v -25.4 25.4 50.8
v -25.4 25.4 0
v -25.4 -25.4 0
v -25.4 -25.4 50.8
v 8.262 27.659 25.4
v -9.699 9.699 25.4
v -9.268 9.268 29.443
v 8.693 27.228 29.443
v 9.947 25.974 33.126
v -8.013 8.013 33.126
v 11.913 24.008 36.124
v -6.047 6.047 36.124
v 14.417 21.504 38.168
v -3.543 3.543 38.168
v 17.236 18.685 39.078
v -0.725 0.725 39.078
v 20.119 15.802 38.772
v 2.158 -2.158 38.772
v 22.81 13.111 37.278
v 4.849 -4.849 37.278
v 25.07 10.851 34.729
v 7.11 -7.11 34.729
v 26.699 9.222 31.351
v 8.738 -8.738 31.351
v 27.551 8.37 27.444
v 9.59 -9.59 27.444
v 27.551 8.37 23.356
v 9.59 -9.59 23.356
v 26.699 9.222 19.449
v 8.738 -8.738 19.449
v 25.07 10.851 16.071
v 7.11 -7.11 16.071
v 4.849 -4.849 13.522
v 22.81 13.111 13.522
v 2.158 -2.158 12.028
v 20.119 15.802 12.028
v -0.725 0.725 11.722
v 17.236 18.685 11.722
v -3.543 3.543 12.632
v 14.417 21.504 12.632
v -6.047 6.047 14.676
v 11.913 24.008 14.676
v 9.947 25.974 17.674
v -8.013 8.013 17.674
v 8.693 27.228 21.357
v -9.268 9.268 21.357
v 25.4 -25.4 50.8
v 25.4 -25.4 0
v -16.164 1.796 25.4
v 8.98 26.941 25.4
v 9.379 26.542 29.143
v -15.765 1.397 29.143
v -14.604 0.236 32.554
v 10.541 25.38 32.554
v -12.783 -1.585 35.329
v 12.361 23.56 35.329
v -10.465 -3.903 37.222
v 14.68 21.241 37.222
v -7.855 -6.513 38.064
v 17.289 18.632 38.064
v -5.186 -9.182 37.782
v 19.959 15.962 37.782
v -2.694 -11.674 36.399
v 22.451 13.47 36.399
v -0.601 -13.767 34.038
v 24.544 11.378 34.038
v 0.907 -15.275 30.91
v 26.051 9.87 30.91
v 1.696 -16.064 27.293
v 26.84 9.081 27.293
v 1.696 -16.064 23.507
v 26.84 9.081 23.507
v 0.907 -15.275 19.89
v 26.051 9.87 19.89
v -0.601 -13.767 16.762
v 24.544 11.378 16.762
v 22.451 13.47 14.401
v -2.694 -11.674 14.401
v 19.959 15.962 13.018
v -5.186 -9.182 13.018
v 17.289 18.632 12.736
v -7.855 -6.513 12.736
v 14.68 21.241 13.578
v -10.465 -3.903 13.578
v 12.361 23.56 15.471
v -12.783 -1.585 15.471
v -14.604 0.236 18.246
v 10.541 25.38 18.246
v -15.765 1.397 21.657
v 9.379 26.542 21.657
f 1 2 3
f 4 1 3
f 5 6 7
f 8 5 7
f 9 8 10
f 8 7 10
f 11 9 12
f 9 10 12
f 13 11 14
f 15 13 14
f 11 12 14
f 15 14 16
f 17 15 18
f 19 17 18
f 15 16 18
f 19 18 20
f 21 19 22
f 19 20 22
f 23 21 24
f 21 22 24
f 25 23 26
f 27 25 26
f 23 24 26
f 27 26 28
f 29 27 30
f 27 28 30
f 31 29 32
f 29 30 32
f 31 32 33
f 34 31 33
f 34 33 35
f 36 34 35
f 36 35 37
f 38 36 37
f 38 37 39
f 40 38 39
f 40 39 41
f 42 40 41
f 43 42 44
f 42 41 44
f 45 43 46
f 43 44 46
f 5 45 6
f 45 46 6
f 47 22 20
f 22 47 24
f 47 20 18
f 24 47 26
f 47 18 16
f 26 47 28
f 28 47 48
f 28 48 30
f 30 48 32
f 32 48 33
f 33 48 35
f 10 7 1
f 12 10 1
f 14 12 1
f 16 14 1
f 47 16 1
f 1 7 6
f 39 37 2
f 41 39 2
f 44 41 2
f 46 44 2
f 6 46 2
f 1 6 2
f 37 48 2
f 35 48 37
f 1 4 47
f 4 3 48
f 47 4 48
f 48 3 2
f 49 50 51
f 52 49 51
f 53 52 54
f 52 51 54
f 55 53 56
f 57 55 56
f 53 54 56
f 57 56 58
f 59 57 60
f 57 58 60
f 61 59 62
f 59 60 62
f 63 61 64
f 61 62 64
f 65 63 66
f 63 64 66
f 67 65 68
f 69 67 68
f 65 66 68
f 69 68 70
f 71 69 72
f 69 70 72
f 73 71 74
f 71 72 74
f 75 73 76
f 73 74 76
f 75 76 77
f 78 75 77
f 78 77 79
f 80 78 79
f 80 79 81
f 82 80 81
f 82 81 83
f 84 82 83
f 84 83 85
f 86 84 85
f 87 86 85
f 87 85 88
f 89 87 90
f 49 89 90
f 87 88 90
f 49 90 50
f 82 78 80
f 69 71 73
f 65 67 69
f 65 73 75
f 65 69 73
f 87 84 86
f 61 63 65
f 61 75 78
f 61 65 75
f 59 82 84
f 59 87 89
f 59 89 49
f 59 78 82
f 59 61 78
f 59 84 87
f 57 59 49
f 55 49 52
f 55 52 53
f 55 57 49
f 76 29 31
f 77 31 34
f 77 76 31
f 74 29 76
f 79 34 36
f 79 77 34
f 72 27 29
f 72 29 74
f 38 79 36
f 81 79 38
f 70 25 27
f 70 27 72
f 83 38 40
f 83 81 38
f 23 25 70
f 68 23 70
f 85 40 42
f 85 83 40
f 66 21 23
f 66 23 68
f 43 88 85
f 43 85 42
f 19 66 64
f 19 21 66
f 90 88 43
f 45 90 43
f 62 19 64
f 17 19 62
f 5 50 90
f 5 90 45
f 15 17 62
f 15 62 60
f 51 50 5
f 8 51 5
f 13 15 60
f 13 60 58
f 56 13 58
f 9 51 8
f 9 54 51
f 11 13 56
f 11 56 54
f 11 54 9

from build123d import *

# Parameters (mm, degrees)
F1_DEPTH = 50.8
F2_R     = 13.716
F3_DEPTH = 25.4
F4_R     = 12.7
F5_DEPTH = 35.56


with BuildPart() as f1:
    # F0 (on Top) → F1 (new body)
    with BuildSketch(Plane.XY):
        Polygon((25.4, -25.4), (-25.4, 25.4), (-25.4, -25.4), align=None)
    extrude(amount=F1_DEPTH)

    # F2 (on face) → F3 (join)
    with BuildSketch(Plane(origin=(0, 0, 0), x_dir=(-0.7071067812, 0.7071067812, 0), z_dir=(0.7071067812, 0.7071067812, 0))):
        with Locations((0, 25.4)):
            Circle(F2_R)
    extrude(amount=F3_DEPTH)

    # F4 (on face) → F5 (cut)
    with BuildSketch(Plane(origin=(17.9605122421, 17.9605122421, 0), x_dir=(-0.7071067812, 0.7071067812, 0), z_dir=(0.7071067812, 0.7071067812, 0))):
        with Locations((0, 25.4)):
            Circle(F4_R)
    extrude(amount=-F5_DEPTH, mode=Mode.SUBTRACT)


solid = f1.part
